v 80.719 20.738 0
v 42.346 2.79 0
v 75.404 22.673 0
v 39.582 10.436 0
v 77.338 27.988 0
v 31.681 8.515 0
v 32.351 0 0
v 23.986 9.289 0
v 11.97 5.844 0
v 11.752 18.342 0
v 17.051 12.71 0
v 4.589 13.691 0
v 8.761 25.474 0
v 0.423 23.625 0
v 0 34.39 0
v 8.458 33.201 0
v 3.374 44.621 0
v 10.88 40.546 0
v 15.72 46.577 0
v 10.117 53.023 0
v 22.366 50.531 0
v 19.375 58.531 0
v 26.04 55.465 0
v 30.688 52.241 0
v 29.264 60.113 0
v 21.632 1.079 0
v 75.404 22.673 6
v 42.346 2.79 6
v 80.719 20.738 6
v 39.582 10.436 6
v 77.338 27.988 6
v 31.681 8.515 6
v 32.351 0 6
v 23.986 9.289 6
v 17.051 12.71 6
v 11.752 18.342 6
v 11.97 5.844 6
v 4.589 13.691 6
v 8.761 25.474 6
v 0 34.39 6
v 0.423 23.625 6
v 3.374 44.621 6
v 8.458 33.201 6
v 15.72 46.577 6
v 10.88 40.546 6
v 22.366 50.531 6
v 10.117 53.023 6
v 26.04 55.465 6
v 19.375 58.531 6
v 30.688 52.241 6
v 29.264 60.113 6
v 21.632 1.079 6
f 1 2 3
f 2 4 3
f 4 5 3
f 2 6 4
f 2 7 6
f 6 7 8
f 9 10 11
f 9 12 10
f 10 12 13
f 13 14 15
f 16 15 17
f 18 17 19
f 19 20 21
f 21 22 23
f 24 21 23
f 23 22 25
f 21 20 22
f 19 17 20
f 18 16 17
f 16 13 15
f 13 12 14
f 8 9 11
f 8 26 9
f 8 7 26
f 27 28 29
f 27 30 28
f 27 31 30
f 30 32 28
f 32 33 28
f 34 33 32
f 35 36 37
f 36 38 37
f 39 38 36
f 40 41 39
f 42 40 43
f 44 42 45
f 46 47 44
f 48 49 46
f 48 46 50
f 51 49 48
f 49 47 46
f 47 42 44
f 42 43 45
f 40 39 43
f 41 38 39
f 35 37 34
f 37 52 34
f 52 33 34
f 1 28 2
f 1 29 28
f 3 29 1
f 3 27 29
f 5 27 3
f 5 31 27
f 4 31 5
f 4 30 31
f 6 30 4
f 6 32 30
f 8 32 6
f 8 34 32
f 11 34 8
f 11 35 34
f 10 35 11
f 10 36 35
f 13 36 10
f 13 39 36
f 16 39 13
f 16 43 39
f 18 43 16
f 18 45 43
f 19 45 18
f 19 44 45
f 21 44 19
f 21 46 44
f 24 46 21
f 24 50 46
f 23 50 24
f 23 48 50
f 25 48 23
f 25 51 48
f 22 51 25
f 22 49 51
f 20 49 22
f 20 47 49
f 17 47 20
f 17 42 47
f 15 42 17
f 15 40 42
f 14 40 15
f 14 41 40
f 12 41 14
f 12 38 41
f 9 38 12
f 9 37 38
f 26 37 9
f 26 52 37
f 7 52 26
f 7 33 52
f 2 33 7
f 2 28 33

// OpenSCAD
$fn = 32;

// ----------------------------------------------------------------------
// Hook plate: curl radius 26 mm over 205 degrees, 8 mm thick band
// ----------------------------------------------------------------------

// --- parameters (mm) ---
profile_height = 6;       // extrusion height
profile_points = 26;      // points of the closed outline

profile = [[26.04, 55.465], [29.264, 60.113], [19.375, 58.531], [10.117, 53.023], [3.374, 44.621], [0, 34.39], [0.423, 23.625], [4.589, 13.691], [11.97, 5.844], [21.632, 1.079], [32.351, 0], [42.346, 2.79], [80.719, 20.738], [75.404, 22.673], [77.338, 27.988], [39.582, 10.436], [31.681, 8.515], [23.986, 9.289], [17.051, 12.71], [11.752, 18.342], [8.761, 25.474], [8.458, 33.201], [10.88, 40.546], [15.72, 46.577], [22.366, 50.531], [30.688, 52.241]];  // single closed polygon, 26 points, counter clockwise

// --- the one profile operation ---
linear_extrude(height = profile_height) polygon(points = profile);
